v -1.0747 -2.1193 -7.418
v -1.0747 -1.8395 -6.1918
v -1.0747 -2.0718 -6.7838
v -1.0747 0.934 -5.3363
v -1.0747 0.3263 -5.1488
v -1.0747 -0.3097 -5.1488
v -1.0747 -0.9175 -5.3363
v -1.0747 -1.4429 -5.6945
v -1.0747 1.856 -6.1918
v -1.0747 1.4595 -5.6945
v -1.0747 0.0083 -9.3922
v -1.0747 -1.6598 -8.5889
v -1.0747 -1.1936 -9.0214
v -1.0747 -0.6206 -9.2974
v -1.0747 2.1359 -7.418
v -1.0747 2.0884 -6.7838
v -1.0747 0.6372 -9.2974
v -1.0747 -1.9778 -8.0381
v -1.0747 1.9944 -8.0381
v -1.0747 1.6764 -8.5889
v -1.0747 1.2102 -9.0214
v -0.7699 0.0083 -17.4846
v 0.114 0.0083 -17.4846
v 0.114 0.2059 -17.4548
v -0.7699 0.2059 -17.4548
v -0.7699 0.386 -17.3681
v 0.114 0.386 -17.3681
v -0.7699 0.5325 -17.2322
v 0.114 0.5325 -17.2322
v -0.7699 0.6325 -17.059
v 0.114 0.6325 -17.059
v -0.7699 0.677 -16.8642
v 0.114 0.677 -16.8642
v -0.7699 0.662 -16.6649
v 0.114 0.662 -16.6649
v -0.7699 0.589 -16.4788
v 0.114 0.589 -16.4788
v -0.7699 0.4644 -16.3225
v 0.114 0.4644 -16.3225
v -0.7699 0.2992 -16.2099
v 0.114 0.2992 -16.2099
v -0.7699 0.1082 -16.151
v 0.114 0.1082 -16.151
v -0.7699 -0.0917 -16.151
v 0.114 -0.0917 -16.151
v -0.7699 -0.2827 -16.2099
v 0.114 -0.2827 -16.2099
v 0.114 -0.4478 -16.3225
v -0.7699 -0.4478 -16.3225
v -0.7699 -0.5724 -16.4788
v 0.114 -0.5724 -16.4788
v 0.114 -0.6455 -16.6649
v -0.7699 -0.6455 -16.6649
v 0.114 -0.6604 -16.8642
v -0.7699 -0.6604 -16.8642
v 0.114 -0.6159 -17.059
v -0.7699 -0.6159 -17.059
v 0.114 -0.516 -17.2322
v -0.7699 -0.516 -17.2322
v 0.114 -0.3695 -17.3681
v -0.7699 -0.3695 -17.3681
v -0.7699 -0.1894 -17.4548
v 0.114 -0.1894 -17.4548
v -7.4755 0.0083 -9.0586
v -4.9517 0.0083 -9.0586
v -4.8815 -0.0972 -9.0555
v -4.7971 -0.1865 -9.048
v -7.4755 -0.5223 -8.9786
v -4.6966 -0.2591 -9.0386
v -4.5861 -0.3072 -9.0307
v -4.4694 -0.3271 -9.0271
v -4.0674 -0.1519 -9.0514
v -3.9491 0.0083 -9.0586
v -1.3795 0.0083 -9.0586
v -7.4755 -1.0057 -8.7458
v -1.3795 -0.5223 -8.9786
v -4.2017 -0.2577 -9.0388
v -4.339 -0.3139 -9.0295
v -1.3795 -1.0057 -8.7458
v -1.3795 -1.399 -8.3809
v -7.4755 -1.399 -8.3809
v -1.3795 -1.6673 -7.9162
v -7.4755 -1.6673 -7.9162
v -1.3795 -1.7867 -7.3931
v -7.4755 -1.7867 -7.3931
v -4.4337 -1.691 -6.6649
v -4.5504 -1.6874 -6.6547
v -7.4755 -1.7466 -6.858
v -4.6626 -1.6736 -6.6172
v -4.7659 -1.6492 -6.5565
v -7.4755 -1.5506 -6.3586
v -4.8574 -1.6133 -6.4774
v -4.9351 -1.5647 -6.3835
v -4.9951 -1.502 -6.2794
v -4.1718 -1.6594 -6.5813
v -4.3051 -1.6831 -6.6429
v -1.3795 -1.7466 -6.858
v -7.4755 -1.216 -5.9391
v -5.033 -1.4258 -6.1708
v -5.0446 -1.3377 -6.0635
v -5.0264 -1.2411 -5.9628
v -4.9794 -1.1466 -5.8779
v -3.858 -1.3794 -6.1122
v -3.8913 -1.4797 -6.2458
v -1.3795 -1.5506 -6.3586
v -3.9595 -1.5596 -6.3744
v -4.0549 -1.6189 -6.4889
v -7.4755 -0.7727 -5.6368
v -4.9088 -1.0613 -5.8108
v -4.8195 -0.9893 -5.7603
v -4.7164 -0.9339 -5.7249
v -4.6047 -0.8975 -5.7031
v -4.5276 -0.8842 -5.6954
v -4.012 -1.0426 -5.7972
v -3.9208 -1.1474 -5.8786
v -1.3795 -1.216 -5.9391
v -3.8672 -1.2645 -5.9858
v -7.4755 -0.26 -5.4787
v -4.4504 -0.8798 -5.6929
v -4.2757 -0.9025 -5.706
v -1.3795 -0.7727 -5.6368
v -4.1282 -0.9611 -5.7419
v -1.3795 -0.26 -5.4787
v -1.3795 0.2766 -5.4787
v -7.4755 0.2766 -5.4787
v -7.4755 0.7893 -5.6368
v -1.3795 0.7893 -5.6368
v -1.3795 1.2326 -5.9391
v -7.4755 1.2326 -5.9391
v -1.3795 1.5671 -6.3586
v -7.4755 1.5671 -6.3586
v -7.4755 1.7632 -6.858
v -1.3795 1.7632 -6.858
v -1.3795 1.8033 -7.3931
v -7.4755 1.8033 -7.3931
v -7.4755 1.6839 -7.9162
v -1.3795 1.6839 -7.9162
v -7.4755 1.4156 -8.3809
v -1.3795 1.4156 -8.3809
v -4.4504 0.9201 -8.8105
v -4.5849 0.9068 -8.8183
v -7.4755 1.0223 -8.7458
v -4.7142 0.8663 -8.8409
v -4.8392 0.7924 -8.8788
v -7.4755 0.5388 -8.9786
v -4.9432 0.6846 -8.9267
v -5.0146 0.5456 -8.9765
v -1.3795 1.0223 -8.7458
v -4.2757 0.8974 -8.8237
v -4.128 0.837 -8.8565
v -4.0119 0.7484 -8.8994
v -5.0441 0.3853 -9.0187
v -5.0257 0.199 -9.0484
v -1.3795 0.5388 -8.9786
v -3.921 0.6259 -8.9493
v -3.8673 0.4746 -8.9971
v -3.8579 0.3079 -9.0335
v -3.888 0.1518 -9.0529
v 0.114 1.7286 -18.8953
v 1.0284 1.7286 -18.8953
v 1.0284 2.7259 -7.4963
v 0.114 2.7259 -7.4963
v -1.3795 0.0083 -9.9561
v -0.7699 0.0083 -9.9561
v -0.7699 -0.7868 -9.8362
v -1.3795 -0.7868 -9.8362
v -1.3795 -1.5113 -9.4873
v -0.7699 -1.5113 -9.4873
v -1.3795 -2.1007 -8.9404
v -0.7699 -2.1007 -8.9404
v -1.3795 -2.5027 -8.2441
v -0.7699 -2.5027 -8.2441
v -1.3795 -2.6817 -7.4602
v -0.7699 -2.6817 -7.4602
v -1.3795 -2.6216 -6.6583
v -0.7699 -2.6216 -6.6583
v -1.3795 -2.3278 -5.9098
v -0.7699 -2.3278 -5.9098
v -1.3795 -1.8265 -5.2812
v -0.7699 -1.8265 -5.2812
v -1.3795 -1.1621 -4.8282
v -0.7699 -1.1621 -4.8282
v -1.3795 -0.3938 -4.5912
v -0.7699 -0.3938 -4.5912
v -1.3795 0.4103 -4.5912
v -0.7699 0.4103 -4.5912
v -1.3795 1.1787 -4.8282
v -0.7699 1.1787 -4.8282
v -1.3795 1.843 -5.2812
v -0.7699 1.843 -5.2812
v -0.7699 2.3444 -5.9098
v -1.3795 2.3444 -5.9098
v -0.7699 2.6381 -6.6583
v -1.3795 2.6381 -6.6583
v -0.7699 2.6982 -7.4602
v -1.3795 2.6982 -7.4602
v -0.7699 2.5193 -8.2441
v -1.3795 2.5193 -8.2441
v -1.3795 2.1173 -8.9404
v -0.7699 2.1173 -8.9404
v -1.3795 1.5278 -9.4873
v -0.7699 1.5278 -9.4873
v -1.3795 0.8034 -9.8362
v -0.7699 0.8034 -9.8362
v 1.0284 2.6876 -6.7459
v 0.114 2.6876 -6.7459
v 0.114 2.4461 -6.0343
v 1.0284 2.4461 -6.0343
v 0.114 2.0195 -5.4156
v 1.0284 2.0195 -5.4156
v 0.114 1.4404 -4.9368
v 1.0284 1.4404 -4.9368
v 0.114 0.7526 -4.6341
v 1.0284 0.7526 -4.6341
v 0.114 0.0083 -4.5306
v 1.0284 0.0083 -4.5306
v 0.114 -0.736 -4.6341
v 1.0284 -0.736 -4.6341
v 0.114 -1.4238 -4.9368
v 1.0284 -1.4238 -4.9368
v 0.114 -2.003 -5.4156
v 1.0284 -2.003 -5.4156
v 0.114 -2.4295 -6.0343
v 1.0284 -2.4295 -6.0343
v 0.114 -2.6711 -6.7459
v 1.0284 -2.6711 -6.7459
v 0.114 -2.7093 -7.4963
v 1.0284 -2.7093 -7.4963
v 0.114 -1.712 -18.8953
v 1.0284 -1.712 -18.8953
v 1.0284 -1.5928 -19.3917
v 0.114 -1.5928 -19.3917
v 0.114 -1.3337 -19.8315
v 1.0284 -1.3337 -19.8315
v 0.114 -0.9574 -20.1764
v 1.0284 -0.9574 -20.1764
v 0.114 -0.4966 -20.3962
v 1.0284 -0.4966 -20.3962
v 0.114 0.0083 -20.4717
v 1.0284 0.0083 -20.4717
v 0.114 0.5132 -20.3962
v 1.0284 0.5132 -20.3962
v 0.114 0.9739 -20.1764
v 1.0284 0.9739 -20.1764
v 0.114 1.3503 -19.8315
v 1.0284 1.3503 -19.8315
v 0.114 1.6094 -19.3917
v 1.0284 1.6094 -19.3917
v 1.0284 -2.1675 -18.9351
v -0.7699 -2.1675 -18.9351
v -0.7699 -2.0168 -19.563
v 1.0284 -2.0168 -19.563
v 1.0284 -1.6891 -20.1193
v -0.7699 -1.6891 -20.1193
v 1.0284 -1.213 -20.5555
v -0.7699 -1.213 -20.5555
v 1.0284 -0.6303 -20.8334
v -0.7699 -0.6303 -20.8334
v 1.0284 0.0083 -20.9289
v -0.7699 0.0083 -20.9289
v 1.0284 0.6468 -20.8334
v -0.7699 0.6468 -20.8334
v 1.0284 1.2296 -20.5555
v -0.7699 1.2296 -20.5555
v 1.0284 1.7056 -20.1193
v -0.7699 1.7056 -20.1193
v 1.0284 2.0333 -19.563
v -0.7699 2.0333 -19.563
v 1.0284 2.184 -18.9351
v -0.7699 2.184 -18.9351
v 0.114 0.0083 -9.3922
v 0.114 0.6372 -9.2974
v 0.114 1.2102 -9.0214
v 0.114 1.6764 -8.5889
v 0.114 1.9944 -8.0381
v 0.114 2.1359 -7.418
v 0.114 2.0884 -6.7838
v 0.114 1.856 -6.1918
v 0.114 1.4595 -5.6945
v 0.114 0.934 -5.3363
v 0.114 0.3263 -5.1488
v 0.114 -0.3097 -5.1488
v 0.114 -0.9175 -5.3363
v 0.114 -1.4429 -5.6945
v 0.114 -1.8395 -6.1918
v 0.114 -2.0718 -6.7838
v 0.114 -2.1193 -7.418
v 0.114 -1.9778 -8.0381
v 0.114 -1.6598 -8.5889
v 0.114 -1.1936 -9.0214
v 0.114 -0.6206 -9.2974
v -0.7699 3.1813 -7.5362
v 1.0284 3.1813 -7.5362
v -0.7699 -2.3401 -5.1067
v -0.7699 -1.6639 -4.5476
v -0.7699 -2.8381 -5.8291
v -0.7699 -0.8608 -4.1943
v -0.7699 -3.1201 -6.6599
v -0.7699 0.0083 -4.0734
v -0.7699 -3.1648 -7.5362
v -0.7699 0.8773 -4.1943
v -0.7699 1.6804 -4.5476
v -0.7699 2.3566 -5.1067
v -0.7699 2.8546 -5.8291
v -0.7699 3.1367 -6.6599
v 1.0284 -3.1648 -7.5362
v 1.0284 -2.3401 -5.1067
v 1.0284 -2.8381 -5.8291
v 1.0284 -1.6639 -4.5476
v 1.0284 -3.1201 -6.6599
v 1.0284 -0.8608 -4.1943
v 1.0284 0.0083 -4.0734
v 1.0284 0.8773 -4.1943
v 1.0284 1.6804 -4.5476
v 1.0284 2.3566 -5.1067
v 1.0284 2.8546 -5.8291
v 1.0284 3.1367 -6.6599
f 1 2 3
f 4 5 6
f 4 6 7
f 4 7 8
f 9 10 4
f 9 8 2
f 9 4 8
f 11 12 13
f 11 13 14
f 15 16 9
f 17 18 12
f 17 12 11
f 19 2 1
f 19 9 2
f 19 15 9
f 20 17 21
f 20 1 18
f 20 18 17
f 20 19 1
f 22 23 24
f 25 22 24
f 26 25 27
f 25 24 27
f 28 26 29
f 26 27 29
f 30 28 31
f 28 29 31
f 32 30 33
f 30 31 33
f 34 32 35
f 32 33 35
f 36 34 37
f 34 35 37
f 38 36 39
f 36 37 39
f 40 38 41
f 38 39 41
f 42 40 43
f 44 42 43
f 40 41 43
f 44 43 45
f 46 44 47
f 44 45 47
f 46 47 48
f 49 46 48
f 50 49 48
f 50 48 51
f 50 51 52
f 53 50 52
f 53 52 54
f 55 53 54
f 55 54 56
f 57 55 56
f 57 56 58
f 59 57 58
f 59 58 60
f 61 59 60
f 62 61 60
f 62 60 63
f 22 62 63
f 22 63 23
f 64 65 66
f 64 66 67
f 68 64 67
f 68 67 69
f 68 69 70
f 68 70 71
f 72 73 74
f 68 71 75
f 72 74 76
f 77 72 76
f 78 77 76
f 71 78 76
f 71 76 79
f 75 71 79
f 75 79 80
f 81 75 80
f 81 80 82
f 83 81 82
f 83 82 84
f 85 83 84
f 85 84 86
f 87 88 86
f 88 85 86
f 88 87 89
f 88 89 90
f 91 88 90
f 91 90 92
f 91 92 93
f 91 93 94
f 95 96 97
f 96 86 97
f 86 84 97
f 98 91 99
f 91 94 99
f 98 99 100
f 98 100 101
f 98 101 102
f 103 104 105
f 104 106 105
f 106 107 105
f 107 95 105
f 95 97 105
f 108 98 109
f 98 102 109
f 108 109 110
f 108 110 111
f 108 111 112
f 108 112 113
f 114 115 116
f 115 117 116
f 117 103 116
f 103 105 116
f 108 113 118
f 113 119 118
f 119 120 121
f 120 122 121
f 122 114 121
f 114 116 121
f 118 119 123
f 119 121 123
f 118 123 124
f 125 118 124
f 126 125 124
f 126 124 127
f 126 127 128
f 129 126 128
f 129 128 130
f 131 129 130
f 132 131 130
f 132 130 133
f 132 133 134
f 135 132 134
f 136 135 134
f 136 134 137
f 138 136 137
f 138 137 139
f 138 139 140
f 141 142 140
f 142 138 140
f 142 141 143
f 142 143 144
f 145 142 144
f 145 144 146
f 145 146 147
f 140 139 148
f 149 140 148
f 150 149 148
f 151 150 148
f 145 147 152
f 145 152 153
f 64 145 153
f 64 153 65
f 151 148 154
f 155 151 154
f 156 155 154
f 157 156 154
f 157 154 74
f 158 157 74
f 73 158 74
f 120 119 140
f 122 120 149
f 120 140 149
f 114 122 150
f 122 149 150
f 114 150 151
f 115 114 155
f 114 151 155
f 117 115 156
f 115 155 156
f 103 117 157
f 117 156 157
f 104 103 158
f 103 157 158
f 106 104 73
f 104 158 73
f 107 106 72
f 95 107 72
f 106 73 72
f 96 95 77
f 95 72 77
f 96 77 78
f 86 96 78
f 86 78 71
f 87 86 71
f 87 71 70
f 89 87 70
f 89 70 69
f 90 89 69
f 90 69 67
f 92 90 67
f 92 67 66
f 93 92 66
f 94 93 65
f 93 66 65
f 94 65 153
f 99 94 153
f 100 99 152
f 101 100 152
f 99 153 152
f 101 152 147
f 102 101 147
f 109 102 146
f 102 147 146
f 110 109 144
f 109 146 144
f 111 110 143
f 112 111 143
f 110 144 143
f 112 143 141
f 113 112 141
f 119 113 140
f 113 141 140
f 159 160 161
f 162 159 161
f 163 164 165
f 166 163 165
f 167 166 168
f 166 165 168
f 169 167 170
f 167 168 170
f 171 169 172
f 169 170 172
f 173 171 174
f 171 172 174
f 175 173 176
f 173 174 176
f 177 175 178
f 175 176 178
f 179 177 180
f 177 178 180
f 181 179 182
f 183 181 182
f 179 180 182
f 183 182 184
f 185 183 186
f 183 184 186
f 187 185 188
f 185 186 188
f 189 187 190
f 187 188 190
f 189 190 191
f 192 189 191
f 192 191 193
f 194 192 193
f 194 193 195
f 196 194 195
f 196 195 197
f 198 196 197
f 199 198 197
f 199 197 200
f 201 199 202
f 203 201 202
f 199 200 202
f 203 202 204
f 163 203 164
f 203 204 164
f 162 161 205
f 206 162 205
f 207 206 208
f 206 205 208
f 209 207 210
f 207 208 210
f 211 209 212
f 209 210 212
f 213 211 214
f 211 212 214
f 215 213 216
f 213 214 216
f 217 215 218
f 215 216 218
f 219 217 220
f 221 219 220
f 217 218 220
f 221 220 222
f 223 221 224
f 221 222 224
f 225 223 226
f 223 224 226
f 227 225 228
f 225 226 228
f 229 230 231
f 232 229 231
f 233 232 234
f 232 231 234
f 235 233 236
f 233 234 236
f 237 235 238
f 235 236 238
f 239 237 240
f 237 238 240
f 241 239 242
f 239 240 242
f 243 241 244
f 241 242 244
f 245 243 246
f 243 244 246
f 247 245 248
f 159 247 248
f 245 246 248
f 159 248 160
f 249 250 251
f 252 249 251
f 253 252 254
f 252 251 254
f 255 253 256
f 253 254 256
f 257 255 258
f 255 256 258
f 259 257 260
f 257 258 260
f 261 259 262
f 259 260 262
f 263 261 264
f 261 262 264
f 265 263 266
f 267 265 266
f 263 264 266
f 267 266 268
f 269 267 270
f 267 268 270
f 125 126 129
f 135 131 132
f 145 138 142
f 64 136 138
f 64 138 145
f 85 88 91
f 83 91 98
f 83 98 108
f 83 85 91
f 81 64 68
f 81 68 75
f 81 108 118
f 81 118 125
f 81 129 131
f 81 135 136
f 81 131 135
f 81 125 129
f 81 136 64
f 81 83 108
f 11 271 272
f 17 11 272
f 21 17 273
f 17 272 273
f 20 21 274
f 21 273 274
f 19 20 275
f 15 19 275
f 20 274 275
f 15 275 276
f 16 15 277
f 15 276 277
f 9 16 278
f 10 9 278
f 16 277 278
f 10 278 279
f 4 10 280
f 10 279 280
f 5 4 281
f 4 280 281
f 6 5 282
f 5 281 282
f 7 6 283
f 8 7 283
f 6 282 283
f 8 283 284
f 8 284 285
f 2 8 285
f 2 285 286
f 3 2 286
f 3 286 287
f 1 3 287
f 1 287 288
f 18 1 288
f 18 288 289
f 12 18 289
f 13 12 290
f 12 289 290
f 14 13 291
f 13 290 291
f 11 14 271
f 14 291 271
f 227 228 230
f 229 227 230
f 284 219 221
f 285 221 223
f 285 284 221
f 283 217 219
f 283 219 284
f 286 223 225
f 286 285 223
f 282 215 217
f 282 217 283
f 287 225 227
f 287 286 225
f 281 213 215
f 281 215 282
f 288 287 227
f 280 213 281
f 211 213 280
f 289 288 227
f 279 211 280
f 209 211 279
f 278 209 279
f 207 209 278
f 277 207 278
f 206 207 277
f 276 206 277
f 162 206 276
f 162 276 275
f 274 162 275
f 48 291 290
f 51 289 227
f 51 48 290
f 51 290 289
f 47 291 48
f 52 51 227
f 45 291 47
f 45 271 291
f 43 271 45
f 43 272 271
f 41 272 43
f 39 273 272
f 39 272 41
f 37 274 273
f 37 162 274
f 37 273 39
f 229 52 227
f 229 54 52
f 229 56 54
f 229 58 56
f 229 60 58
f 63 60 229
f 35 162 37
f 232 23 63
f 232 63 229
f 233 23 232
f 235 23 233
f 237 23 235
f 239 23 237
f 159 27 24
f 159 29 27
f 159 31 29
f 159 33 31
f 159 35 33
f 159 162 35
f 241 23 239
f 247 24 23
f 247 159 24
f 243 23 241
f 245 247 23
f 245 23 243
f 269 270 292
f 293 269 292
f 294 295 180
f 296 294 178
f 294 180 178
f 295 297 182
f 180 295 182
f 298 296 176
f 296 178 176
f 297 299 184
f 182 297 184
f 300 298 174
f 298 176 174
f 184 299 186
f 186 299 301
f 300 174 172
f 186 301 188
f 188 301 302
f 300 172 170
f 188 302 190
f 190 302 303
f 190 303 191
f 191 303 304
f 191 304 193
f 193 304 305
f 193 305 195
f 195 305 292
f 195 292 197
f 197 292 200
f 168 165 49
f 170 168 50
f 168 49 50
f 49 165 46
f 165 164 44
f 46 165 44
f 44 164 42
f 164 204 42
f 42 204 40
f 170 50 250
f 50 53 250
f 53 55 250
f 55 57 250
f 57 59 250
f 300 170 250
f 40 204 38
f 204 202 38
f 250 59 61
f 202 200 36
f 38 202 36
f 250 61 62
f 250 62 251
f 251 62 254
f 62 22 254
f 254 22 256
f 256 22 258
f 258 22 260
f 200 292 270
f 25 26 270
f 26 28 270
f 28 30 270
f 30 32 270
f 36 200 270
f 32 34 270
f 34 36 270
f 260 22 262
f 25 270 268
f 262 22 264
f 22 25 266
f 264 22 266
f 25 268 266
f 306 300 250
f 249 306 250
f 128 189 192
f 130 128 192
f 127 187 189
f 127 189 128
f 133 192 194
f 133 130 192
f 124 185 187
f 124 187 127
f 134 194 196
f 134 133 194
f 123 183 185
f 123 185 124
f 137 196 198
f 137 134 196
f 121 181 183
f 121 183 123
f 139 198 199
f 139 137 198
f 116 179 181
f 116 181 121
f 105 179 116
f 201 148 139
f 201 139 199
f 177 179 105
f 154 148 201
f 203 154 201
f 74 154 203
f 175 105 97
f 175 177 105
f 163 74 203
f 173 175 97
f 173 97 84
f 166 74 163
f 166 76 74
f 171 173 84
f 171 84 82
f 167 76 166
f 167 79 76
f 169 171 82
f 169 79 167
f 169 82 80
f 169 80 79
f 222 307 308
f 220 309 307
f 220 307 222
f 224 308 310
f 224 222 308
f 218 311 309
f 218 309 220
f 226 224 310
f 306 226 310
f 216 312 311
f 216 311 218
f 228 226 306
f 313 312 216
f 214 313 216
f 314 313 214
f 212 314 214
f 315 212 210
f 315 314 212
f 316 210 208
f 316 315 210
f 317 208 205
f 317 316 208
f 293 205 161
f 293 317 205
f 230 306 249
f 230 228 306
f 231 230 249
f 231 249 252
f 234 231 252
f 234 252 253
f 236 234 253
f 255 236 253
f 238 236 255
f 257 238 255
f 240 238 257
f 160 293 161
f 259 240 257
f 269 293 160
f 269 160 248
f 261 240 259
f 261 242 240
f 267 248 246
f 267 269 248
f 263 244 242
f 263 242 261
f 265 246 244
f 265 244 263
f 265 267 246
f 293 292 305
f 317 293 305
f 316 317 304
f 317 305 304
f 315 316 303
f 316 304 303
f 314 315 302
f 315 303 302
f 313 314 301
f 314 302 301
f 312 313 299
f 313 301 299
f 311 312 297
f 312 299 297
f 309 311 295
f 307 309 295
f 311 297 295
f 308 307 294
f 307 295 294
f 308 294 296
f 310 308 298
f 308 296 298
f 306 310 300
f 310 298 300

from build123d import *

# Parameters (mm, degrees)
BOSS_EXTRUDE1_DEPTH = 2.9972
SKETCH2_R           = 3
BOSS_EXTRUDE2_DEPTH = 11.176
SKETCH3_R           = 4.4958
BOSS_EXTRUDE3_DEPTH = 1.016
CUT_EXTRUDE1_DEPTH  = 1.524
SKETCH5_R           = 3.556
CUT_EXTRUDE2_DEPTH  = 1.9812
SKETCH6_R           = 1.1176
CUT_EXTRUDE3_DEPTH  = 32.262860272
SKETCH9_R           = 0.9906
CUT_EXTRUDE4_DEPTH  = 10.16
SCALE1_SCALE        = 0.6


with BuildPart() as part:
    # Sketch1 → Boss-Extrude1 (new body)
    with BuildSketch(Plane(origin=(0, 0, 0), x_dir=(0, 0, -1), z_dir=(1, 0, 0))):
        with BuildLine():
            Line((24.769539012, 3.626266444), (5.771274976, 5.288399174))
            ThreePointArc((5.771274976, 5.288399174), (0, 0), (5.771274976, -5.288399174))
            Line((5.771274976, -5.288399174), (24.769539012, -3.626266444))
            ThreePointArc((24.769539012, -3.626266444), (28.0924, 0), (24.769539012, 3.626266444))
        make_face()
    extrude(amount=BOSS_EXTRUDE1_DEPTH)

    # Sketch2 → Boss-Extrude2 (add)
    with BuildSketch(Plane.ZY):
        with Locations(Location((-5.3086, 0, 0), (0, 0, 180))):
            Circle(SKETCH2_R)
    extrude(amount=BOSS_EXTRUDE2_DEPTH)

    # Sketch3 → Boss-Extrude3 (add)
    with BuildSketch(Plane.ZY):
        with Locations(Location((-5.3086, 0, 0), (0, 0, 180))):
            Circle(SKETCH3_R)
    extrude(amount=BOSS_EXTRUDE3_DEPTH)

    # Sketch4 → Cut-Extrude1 (cut)
    with BuildSketch(Plane(origin=(2.9972, 0, 0), x_dir=(0, 0, -1), z_dir=(1, 0, 0))):
        with BuildLine():
            Line((24.703126336, 2.867166085), (5.7048623, 4.529298814))
            ThreePointArc((5.7048623, 4.529298814), (0.762, 0), (5.7048623, -4.529298814))
            Line((5.7048623, -4.529298814), (24.703126336, -2.867166085))
            ThreePointArc((24.703126336, -2.867166085), (27.3304, 0), (24.703126336, 2.867166085))
        make_face()
    extrude(amount=-CUT_EXTRUDE1_DEPTH, mode=Mode.SUBTRACT)

    # Sketch5 → Cut-Extrude2 (cut)
    with BuildSketch(Plane(origin=(1.4732, 0, 0), x_dir=(0, 0, -1), z_dir=(1, 0, 0))):
        with Locations((5.3086, 0)):
            Circle(SKETCH5_R)
    extrude(amount=-CUT_EXTRUDE2_DEPTH, mode=Mode.SUBTRACT)

    # Sketch6 → Cut-Extrude3 (cut, through all)
    with BuildSketch(Plane(origin=(1.4732, 0, 0), x_dir=(0, 0, -1), z_dir=(1, 0, 0))):
        with Locations((21.2344, 0)):
            Circle(SKETCH6_R)
    extrude(amount=-CUT_EXTRUDE3_DEPTH, mode=Mode.SUBTRACT)

    # Sketch9 → Cut-Extrude4 (cut)
    with BuildSketch(Plane(origin=(0, 4.943430386, -8.562272593), x_dir=(-1, 0, 0), z_dir=(0, 0.5000000000000044, -0.866025403784436))):
        with Locations(Location((6.134133556, -3.622041732, 0), (0, 0, 90))):
            Circle(SKETCH9_R)
    extrude(amount=-CUT_EXTRUDE4_DEPTH, mode=Mode.SUBTRACT)


with BuildPart() as part_1:
    # Scale1: scaled about (-1.924771694, 0.020710346, -10.183561465)
    add(part.part.scale(SCALE1_SCALE).moved(Location((-0.769908678, 0.008284138, -4.073424586))))


solid = part_1.part
